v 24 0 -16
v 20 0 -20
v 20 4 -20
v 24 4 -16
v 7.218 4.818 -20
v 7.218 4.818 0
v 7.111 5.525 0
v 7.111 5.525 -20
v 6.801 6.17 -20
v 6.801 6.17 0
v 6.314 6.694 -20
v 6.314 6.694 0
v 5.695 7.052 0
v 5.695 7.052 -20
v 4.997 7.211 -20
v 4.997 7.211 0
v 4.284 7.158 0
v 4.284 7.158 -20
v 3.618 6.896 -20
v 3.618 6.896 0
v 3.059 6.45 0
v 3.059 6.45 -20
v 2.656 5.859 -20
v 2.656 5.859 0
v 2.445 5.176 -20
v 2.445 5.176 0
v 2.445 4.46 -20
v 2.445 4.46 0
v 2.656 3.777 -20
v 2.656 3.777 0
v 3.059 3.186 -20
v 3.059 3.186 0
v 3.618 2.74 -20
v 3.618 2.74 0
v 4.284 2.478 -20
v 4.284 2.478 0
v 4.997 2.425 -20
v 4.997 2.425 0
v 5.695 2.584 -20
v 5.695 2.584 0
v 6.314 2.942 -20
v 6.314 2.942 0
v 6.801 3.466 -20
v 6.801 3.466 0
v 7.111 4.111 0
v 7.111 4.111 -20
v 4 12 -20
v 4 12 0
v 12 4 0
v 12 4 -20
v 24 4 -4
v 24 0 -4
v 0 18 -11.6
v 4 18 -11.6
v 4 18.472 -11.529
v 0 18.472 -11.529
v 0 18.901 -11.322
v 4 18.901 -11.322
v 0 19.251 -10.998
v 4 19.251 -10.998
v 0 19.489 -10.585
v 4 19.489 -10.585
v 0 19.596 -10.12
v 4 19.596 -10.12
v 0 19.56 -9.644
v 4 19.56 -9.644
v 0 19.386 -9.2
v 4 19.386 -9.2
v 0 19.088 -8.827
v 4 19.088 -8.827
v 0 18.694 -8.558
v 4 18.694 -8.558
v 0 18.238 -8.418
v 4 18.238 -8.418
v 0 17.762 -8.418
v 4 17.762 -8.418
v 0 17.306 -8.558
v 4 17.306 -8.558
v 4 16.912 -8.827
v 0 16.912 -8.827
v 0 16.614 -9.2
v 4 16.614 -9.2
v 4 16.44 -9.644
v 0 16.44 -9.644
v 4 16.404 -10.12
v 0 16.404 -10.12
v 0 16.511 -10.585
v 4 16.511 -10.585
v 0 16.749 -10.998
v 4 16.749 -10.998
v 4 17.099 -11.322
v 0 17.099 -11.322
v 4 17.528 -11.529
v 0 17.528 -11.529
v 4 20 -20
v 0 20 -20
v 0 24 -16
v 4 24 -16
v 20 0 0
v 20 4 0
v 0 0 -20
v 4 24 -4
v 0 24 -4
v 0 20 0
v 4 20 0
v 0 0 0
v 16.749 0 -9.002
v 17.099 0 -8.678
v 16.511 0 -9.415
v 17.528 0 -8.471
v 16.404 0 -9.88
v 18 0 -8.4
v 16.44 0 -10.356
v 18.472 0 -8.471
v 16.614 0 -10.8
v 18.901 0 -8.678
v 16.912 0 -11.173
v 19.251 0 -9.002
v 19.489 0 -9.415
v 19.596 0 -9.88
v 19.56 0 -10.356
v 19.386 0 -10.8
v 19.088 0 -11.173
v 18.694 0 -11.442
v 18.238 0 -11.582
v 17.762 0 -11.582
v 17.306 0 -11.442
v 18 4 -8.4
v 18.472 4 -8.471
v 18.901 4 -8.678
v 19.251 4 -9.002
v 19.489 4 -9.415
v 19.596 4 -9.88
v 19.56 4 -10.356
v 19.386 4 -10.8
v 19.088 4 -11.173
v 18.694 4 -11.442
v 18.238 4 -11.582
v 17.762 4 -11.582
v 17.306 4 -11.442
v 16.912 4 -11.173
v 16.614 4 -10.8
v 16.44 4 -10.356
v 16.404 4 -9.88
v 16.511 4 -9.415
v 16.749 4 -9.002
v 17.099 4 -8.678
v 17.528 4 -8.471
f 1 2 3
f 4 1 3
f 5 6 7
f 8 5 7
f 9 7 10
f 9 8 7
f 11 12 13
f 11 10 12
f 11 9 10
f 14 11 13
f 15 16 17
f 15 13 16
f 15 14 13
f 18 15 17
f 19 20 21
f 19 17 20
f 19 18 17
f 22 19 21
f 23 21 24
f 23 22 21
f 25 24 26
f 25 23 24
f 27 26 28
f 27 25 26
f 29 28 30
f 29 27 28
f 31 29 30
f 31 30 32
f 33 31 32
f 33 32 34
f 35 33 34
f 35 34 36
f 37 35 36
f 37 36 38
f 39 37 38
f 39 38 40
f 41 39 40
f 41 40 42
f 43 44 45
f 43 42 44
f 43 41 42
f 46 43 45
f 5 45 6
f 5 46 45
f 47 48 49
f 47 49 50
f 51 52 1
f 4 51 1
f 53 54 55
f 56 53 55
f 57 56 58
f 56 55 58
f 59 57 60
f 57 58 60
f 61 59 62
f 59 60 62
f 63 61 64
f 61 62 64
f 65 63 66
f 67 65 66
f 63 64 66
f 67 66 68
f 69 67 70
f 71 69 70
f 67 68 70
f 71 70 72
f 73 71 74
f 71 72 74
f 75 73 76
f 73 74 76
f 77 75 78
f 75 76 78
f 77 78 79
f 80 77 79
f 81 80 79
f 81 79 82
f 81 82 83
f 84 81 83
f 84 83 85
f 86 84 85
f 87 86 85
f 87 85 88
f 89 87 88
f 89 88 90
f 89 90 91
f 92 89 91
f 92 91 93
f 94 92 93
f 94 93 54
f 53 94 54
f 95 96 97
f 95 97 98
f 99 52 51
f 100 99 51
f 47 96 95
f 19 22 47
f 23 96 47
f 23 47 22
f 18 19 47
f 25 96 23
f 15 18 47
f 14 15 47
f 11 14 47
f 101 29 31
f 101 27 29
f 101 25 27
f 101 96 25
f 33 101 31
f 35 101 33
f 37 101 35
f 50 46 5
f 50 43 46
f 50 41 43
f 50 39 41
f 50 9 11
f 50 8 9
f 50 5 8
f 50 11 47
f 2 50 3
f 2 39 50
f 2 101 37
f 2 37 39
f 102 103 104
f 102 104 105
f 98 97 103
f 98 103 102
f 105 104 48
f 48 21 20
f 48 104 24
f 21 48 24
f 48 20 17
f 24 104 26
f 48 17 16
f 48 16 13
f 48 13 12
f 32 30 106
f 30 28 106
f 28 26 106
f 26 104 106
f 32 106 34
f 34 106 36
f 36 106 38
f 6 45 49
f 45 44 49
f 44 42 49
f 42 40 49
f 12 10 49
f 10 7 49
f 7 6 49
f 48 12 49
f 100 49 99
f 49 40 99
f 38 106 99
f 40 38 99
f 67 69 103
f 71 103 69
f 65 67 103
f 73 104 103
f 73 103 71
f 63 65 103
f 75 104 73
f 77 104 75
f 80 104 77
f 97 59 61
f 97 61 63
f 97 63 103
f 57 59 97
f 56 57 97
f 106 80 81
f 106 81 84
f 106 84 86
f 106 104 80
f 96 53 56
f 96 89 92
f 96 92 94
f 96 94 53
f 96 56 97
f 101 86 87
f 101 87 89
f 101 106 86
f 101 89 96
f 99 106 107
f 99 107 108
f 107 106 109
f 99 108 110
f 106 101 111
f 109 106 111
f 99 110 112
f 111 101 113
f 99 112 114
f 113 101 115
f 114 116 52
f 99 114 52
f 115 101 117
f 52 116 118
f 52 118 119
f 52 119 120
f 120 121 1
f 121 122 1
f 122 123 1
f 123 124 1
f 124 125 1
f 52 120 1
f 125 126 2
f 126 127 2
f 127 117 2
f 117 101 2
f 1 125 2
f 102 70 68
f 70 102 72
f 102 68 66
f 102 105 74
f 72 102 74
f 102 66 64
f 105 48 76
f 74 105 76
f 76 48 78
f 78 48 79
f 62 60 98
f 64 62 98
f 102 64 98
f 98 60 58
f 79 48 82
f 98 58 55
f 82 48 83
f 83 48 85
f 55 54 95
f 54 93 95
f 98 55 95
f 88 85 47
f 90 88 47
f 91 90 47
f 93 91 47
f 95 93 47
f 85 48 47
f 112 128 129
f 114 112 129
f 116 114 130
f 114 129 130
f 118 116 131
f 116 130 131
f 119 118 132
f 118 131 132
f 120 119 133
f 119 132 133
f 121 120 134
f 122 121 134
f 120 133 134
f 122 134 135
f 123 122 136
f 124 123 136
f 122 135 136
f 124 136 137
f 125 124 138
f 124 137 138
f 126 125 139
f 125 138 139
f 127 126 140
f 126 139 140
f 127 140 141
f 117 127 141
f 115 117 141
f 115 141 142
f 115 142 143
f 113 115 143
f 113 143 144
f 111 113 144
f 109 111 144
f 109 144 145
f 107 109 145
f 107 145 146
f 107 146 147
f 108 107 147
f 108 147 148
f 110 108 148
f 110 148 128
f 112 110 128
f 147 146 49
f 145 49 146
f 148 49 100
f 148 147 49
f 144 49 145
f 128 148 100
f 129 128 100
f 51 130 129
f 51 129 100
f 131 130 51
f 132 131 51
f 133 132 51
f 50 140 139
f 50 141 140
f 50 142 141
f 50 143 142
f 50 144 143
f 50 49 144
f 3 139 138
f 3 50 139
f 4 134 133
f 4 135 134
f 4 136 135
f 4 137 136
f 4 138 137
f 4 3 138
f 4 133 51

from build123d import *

# Parameters (mm, degrees)
SKETCH1_W               = 24
SKETCH1_H               = 20
BOSS_EXTRUDE1_DEPTH     = 4
SKETCH2_W               = 4
SKETCH2_H               = 20
BOSS_EXTRUDE2_DEPTH     = 20
CHAMFER1_SIZE           = 8
SKETCH3_R               = 1.6
CUT_EXTRUDE1_DEPTH      = 20
SKETCH4_R               = 1.6
CUT_EXTRUDE2_DEPTH      = 20
CHAMFER2_SIZE           = 4
CUT_EXTRUDE3_DEPTH      = 40.395431207
CUT_EXTRUDE3_DEPTH_BACK = 40.395431207
SKETCH5_R               = 2.4


with BuildPart() as part:
    # Sketch1 → Boss-Extrude1 (new body)
    with BuildSketch(Plane(origin=(0, 0, 0), x_dir=(1, 0, 0), z_dir=(0, 1, 0))):
        with Locations((12, 10)):
            Rectangle(SKETCH1_W, SKETCH1_H)
    extrude(amount=BOSS_EXTRUDE1_DEPTH)

    # Sketch2 → Boss-Extrude2 (add)
    with BuildSketch(Plane(origin=(0, 4, 0), x_dir=(1, 0, 0), z_dir=(0, 1, 0))):
        with Locations((2, 10)):
            Rectangle(SKETCH2_W, SKETCH2_H)
    extrude(amount=BOSS_EXTRUDE2_DEPTH)

    # Chamfer1
    chamfer1_edges = [part.edges().sort_by_distance(p)[0] for p in [
        (4, 4, -10),
    ]]
    chamfer(chamfer1_edges, length=CHAMFER1_SIZE)

    # Sketch3 → Cut-Extrude1 (cut)
    with BuildSketch(Plane(origin=(0, 4, 0), x_dir=(1, 0, 0), z_dir=(0, 1, 0))):
        with Locations(Location((18, 10, 0), (0, 0, 270))):
            Circle(SKETCH3_R)
    extrude(amount=-CUT_EXTRUDE1_DEPTH, mode=Mode.SUBTRACT)

    # Sketch4 → Cut-Extrude2 (cut)
    with BuildSketch(Plane(origin=(4, 0, 0), x_dir=(0, 0, -1), z_dir=(1, 0, 0))):
        with Locations((10, 18)):
            Circle(SKETCH4_R)
    extrude(amount=-CUT_EXTRUDE2_DEPTH, mode=Mode.SUBTRACT)

    # Chamfer2
    chamfer2_edges = [part.edges().sort_by_distance(p)[0] for p in [
        (2, 24, 0),
        (2, 24, -20),
        (24, 2, -20),
        (24, 2, 0),
    ]]
    chamfer(chamfer2_edges, length=CHAMFER2_SIZE)

    # Sketch5 → Cut-Extrude3 (cut, two sides: drawn at the far end of the back side and taken through both)
    with BuildSketch(Plane.XY.offset(-CUT_EXTRUDE3_DEPTH_BACK)):
        with Locations((4.818019485, 4.818019485)):
            Circle(SKETCH5_R)
    extrude(amount=CUT_EXTRUDE3_DEPTH + CUT_EXTRUDE3_DEPTH_BACK, mode=Mode.SUBTRACT)


solid = part.part
